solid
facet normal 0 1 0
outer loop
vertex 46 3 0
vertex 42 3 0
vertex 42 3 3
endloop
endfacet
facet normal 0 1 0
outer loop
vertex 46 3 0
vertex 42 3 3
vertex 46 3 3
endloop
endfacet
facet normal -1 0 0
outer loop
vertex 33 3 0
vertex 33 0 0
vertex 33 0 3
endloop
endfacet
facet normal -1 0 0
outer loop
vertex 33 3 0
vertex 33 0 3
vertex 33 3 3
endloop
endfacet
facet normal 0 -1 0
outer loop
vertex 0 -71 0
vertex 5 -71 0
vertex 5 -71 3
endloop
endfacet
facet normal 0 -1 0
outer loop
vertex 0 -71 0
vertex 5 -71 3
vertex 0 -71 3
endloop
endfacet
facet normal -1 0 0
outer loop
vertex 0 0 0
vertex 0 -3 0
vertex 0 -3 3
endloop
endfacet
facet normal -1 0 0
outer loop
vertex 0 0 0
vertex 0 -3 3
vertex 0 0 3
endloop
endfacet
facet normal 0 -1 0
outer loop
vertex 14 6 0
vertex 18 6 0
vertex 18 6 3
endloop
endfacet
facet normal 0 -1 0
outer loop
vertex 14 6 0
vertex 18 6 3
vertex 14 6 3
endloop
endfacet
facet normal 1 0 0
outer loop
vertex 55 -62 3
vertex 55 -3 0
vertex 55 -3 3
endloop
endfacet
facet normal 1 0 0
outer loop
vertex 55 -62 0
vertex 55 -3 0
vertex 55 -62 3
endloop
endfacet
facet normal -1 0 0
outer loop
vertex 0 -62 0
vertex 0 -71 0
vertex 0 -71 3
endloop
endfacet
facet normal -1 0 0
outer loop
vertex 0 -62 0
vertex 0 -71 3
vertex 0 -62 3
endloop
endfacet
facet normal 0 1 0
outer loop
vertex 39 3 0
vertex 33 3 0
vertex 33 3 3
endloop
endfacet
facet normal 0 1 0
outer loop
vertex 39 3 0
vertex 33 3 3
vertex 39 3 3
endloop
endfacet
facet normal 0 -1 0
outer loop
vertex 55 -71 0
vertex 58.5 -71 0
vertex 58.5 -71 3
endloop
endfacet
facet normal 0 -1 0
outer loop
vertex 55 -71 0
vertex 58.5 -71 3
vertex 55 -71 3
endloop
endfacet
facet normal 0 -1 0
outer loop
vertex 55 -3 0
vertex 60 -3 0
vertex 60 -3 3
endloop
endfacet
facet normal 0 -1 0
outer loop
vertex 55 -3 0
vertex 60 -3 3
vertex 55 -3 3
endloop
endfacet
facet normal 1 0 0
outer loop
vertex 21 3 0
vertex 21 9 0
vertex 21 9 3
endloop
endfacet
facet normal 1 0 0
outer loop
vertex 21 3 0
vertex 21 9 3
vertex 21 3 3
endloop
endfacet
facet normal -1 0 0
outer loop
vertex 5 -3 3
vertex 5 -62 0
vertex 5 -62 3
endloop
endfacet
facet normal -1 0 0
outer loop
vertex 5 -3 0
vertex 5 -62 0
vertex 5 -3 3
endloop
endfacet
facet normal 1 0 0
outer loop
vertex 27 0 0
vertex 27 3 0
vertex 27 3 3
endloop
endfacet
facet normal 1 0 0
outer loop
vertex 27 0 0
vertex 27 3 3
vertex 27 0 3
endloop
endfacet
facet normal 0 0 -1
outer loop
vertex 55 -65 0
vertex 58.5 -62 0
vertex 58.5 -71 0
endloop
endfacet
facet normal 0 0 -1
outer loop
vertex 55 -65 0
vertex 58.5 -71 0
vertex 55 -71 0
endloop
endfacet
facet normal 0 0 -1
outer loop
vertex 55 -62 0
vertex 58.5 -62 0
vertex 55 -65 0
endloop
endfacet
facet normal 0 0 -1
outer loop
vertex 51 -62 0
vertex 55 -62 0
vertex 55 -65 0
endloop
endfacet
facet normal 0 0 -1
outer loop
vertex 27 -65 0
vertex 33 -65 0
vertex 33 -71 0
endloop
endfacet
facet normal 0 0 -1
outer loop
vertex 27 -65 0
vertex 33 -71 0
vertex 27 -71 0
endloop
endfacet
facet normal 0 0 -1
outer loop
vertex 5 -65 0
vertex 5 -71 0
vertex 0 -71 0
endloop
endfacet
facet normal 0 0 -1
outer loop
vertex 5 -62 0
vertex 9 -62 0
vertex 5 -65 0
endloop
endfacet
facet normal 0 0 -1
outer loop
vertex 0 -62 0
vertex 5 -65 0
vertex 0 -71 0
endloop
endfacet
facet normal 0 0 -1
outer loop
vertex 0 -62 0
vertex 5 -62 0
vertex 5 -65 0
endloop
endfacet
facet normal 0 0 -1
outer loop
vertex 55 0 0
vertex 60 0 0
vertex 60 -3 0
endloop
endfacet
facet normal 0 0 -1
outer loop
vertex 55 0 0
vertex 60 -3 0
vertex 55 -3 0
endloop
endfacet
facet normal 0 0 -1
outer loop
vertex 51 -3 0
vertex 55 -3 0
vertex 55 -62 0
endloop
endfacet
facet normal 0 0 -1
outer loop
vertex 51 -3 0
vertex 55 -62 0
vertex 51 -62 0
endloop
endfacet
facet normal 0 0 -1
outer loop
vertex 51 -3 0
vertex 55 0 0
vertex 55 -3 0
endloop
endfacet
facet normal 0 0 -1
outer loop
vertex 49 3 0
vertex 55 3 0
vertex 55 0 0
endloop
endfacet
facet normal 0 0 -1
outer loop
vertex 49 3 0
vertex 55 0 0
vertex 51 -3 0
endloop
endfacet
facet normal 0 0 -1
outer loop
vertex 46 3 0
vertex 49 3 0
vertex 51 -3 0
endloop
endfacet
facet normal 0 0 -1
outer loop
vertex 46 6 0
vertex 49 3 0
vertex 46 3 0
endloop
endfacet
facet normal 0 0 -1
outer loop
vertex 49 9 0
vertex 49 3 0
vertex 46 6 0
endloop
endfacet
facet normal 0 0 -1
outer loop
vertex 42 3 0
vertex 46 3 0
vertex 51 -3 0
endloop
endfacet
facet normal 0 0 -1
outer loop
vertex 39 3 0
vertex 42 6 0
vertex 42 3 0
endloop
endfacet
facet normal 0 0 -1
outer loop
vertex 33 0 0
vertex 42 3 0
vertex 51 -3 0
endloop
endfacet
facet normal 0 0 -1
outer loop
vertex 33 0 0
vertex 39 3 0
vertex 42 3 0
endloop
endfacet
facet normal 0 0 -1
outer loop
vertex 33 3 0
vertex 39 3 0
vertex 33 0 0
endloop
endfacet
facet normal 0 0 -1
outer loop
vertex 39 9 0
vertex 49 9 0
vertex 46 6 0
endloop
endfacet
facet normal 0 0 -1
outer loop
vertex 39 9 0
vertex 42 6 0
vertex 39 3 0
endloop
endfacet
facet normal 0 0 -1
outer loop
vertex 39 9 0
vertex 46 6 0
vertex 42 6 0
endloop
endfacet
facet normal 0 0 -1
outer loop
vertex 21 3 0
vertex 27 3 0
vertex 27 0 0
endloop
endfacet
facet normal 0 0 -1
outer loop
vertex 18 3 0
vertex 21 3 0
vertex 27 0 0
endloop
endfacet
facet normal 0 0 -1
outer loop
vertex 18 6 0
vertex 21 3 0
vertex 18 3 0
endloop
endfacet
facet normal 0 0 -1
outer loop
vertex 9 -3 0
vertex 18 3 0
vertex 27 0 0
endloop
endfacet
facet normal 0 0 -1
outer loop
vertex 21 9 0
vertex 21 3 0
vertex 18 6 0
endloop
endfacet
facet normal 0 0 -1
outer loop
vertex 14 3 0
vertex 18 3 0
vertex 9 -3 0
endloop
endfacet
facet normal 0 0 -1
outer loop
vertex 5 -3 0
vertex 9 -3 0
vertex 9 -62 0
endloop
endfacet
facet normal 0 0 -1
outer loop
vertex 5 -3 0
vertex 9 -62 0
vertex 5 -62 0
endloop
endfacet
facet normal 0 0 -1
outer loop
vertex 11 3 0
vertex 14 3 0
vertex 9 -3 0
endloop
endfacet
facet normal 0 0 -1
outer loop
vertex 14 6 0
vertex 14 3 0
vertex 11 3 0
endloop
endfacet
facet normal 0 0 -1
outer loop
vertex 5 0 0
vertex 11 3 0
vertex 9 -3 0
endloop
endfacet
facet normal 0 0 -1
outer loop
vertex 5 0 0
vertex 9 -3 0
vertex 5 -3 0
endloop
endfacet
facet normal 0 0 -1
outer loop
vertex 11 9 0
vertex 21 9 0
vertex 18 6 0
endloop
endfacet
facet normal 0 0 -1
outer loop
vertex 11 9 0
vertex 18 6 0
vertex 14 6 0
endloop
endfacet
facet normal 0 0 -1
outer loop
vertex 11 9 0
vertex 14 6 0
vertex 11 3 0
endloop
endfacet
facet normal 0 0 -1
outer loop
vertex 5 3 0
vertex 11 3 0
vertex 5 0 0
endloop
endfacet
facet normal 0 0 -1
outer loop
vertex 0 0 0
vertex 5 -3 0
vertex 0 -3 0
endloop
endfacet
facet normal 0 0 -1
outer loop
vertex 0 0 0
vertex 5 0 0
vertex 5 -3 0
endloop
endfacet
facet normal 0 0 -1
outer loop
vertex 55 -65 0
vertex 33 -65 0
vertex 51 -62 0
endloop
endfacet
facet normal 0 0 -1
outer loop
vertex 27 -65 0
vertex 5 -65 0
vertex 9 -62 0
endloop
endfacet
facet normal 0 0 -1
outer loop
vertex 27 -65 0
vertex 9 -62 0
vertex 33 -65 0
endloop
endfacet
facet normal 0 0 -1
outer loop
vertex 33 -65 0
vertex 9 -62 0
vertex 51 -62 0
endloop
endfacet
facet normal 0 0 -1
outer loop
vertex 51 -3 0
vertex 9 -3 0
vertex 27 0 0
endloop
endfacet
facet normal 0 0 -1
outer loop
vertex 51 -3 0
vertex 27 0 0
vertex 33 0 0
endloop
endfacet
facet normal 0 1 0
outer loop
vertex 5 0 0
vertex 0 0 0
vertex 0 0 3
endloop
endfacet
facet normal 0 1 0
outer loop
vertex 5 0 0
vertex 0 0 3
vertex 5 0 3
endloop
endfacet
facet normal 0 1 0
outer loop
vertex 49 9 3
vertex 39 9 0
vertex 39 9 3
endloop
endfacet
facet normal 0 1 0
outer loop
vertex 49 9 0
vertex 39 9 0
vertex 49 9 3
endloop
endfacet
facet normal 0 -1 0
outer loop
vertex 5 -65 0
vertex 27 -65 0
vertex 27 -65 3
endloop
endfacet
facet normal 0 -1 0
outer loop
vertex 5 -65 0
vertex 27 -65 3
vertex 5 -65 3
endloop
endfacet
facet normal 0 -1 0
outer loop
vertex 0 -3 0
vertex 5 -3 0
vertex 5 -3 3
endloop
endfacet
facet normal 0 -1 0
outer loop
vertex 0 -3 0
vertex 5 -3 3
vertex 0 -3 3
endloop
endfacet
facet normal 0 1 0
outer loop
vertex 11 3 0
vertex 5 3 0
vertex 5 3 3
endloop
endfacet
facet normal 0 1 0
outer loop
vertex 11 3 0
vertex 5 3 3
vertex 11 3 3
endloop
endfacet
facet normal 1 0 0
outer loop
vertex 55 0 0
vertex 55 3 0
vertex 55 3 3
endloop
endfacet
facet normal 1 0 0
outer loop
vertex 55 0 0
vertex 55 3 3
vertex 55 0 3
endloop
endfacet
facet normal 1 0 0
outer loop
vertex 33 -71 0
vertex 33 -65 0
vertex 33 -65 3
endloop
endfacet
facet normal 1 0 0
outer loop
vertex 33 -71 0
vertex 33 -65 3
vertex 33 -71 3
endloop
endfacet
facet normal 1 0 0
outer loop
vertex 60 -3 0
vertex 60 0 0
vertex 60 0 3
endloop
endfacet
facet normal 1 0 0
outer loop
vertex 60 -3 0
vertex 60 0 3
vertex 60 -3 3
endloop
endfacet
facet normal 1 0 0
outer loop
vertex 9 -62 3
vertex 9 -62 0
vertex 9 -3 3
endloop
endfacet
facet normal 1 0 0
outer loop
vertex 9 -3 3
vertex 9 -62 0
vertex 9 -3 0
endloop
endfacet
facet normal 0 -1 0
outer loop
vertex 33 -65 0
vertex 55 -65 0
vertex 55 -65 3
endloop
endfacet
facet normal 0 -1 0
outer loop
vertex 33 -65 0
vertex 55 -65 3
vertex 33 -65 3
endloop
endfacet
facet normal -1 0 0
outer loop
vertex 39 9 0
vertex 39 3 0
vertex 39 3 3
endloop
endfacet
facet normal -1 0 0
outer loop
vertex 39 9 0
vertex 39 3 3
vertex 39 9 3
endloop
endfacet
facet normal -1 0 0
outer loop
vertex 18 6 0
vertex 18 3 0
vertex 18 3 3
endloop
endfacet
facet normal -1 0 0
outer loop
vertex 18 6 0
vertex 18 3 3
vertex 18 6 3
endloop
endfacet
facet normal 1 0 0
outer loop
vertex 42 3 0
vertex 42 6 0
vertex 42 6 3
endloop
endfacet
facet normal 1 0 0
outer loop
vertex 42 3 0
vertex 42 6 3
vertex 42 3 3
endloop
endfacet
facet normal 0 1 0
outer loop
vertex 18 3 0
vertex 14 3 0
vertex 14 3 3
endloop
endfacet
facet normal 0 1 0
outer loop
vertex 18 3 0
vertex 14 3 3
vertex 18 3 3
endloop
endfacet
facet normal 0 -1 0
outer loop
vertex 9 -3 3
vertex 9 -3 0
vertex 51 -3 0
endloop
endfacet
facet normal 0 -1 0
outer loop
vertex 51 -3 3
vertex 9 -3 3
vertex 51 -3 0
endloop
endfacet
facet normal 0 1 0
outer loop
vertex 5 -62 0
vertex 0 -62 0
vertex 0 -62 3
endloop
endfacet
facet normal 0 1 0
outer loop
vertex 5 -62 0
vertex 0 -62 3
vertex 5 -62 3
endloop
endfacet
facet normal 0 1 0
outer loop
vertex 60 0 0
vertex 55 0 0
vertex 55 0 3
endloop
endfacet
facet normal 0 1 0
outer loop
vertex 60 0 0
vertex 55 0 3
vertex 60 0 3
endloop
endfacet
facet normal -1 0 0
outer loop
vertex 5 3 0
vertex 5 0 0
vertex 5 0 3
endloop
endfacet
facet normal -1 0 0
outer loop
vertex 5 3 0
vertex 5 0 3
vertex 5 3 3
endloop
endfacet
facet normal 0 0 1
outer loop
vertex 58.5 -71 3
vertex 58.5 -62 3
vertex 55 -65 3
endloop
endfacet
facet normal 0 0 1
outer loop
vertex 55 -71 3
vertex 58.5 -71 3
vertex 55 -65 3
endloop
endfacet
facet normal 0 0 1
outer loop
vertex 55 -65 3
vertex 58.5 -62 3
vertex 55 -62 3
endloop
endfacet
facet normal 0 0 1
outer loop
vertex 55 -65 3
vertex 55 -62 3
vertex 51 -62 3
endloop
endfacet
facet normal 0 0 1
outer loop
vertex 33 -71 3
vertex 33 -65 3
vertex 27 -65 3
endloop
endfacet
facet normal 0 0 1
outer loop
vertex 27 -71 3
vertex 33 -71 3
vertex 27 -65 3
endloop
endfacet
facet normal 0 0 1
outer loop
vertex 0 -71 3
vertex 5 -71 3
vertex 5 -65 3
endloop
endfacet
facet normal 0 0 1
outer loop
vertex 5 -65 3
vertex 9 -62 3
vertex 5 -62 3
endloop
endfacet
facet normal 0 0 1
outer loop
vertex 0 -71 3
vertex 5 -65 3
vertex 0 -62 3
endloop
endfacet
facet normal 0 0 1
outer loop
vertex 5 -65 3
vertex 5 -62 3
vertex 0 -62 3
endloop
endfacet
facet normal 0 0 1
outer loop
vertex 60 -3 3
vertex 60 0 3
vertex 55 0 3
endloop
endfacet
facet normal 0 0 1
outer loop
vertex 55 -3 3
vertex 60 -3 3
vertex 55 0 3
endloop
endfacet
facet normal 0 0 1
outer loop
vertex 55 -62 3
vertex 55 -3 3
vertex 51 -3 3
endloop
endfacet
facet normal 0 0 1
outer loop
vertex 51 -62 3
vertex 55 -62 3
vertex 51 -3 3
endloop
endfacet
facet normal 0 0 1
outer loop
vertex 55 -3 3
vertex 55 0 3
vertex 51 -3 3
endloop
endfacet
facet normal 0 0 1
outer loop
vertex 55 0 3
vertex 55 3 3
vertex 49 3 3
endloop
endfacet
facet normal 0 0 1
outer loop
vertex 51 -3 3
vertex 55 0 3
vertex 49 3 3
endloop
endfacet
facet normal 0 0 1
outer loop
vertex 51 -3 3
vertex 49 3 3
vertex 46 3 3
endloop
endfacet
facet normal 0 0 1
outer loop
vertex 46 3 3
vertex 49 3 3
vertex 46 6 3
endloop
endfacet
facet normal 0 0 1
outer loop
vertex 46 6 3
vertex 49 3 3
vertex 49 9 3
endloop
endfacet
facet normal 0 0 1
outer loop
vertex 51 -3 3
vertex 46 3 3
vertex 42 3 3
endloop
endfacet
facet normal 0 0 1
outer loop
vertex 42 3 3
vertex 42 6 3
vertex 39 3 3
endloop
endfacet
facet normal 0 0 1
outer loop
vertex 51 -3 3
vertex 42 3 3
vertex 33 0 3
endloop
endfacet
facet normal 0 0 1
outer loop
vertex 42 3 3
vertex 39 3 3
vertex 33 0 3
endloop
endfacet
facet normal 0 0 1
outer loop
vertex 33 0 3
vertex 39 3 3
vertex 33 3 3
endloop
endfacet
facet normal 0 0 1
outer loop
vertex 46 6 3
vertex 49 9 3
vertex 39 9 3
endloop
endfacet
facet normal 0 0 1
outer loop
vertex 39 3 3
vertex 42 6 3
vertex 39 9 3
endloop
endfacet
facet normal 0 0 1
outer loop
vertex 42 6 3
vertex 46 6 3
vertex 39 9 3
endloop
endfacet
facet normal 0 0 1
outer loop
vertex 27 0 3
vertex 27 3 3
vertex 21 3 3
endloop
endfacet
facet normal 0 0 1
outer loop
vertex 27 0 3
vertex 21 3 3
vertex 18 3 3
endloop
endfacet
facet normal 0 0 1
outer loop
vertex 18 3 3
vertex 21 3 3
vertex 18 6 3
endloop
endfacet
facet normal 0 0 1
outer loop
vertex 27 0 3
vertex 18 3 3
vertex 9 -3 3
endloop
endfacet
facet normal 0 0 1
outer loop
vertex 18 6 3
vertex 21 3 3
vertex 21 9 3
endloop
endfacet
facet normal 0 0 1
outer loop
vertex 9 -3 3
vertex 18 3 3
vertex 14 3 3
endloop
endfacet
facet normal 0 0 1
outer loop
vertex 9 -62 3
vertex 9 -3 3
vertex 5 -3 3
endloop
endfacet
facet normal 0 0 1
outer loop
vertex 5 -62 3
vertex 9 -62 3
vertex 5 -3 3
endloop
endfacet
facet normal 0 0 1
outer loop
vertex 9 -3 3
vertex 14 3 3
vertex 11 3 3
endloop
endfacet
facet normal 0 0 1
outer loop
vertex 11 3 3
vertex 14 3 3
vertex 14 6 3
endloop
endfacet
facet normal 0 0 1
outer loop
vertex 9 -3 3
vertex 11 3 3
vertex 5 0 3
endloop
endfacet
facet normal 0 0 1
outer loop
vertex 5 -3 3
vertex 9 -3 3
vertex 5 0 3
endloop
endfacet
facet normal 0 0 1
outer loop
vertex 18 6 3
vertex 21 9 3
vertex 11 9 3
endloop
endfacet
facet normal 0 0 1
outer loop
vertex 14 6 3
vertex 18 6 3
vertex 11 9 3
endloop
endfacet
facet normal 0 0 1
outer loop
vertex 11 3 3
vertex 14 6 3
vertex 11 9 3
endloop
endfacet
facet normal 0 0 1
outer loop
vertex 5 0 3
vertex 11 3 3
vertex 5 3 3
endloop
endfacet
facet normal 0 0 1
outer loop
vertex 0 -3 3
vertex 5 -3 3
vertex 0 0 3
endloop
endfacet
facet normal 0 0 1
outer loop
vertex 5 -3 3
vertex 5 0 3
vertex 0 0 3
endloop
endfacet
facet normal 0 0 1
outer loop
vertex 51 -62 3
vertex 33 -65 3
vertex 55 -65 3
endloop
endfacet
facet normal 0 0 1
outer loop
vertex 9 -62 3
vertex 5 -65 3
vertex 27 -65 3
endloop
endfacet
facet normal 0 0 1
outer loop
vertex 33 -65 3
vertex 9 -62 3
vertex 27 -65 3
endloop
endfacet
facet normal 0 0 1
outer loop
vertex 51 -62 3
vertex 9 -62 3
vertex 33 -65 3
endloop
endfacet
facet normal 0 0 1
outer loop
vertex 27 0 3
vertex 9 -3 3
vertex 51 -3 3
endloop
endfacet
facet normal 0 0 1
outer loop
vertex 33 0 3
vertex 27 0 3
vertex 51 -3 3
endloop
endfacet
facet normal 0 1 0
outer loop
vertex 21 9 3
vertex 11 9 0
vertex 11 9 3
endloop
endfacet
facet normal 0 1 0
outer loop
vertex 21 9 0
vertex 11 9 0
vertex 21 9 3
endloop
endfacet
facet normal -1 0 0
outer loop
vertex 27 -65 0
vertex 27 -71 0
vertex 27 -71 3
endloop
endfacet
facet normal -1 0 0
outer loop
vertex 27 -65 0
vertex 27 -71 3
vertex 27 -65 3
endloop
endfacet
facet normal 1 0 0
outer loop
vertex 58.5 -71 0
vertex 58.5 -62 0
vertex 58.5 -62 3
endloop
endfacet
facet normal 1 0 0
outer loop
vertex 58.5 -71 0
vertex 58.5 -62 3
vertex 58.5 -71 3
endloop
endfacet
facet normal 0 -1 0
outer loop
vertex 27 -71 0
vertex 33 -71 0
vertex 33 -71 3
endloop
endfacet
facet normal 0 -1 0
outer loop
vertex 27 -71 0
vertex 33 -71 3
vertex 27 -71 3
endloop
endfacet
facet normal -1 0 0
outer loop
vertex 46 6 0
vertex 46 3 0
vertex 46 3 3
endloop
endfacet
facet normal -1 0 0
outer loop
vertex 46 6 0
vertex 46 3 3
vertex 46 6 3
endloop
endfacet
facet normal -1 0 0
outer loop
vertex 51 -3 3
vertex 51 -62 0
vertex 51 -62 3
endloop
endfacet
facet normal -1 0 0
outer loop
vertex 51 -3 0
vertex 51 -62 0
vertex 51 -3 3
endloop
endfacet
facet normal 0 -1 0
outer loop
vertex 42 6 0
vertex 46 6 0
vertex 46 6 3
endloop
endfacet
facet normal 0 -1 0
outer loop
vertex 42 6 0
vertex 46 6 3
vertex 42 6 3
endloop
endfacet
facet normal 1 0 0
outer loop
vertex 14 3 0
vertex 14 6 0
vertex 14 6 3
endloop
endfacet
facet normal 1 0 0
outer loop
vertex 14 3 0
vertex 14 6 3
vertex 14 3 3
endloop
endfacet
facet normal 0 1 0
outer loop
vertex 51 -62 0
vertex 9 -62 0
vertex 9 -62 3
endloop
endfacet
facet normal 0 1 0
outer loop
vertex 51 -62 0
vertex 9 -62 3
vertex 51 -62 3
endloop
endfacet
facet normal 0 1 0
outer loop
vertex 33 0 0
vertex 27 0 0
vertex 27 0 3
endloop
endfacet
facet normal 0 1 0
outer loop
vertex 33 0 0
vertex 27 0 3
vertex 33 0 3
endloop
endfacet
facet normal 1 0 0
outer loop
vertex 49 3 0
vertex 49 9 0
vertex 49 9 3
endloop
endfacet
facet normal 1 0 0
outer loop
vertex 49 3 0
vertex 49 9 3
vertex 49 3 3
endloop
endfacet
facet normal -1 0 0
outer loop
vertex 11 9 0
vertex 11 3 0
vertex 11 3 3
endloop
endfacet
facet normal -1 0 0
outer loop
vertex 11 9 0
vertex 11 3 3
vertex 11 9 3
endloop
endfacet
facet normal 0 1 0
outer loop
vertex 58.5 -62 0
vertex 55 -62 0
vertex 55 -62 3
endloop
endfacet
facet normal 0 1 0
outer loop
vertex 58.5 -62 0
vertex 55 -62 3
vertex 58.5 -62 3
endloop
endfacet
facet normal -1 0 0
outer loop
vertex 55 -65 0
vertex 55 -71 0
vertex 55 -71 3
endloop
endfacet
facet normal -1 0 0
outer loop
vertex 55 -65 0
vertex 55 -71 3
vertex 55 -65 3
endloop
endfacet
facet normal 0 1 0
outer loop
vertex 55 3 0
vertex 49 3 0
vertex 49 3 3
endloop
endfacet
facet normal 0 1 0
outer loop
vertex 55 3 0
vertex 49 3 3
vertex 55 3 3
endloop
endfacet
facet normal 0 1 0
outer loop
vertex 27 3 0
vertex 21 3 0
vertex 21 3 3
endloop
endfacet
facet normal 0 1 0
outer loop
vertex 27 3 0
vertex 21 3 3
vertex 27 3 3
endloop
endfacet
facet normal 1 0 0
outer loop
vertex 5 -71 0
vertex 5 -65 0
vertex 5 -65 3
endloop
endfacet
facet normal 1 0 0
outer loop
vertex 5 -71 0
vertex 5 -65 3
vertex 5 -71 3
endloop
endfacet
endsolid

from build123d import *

# Parameters (mm, degrees)
SKETCH1_W           = 42
SKETCH1_H           = 59
BOSS_EXTRUDE1_DEPTH = 3
BOSS_EXTRUDE2_DEPTH = 3


with BuildPart() as part:
    # Sketch1 → Boss-Extrude1 (new body)
    with BuildSketch(Plane.XY):
        Polygon((0, 0), (5, 0), (5, 3), (27, 3), (27, 0), (33, 0), (33, 3), (55, 3), (55, 0), (60, 0), (60, -3), (55, -3), (55, -62), (58.5, -62), (58.5, -71), (55, -71), (55, -65), (33, -65), (33, -71), (27, -71), (27, -65), (5, -65), (5, -71), (0, -71), (0, -62), (5, -62), (5, -3), (0, -3), align=None)
        with Locations((30, -32.5)):
            Rectangle(SKETCH1_W, SKETCH1_H, mode=Mode.SUBTRACT)
    extrude(amount=BOSS_EXTRUDE1_DEPTH)

    # Sketch2 → Boss-Extrude2 (add)
    with BuildSketch(Plane(origin=(0, 0, 0), x_dir=(-1, 0, 0), z_dir=(0, 0, -1))):
        Polygon((-49, 9), (-49, 3), (-46, 3), (-46, 6), (-42, 6), (-42, 3), (-39, 3), (-39, 9), align=None)
        Polygon((-21, 3), (-18, 3), (-18, 6), (-14, 6), (-14, 3), (-11, 3), (-11, 9), (-21, 9), align=None)
    extrude(amount=-BOSS_EXTRUDE2_DEPTH)


solid = part.part
